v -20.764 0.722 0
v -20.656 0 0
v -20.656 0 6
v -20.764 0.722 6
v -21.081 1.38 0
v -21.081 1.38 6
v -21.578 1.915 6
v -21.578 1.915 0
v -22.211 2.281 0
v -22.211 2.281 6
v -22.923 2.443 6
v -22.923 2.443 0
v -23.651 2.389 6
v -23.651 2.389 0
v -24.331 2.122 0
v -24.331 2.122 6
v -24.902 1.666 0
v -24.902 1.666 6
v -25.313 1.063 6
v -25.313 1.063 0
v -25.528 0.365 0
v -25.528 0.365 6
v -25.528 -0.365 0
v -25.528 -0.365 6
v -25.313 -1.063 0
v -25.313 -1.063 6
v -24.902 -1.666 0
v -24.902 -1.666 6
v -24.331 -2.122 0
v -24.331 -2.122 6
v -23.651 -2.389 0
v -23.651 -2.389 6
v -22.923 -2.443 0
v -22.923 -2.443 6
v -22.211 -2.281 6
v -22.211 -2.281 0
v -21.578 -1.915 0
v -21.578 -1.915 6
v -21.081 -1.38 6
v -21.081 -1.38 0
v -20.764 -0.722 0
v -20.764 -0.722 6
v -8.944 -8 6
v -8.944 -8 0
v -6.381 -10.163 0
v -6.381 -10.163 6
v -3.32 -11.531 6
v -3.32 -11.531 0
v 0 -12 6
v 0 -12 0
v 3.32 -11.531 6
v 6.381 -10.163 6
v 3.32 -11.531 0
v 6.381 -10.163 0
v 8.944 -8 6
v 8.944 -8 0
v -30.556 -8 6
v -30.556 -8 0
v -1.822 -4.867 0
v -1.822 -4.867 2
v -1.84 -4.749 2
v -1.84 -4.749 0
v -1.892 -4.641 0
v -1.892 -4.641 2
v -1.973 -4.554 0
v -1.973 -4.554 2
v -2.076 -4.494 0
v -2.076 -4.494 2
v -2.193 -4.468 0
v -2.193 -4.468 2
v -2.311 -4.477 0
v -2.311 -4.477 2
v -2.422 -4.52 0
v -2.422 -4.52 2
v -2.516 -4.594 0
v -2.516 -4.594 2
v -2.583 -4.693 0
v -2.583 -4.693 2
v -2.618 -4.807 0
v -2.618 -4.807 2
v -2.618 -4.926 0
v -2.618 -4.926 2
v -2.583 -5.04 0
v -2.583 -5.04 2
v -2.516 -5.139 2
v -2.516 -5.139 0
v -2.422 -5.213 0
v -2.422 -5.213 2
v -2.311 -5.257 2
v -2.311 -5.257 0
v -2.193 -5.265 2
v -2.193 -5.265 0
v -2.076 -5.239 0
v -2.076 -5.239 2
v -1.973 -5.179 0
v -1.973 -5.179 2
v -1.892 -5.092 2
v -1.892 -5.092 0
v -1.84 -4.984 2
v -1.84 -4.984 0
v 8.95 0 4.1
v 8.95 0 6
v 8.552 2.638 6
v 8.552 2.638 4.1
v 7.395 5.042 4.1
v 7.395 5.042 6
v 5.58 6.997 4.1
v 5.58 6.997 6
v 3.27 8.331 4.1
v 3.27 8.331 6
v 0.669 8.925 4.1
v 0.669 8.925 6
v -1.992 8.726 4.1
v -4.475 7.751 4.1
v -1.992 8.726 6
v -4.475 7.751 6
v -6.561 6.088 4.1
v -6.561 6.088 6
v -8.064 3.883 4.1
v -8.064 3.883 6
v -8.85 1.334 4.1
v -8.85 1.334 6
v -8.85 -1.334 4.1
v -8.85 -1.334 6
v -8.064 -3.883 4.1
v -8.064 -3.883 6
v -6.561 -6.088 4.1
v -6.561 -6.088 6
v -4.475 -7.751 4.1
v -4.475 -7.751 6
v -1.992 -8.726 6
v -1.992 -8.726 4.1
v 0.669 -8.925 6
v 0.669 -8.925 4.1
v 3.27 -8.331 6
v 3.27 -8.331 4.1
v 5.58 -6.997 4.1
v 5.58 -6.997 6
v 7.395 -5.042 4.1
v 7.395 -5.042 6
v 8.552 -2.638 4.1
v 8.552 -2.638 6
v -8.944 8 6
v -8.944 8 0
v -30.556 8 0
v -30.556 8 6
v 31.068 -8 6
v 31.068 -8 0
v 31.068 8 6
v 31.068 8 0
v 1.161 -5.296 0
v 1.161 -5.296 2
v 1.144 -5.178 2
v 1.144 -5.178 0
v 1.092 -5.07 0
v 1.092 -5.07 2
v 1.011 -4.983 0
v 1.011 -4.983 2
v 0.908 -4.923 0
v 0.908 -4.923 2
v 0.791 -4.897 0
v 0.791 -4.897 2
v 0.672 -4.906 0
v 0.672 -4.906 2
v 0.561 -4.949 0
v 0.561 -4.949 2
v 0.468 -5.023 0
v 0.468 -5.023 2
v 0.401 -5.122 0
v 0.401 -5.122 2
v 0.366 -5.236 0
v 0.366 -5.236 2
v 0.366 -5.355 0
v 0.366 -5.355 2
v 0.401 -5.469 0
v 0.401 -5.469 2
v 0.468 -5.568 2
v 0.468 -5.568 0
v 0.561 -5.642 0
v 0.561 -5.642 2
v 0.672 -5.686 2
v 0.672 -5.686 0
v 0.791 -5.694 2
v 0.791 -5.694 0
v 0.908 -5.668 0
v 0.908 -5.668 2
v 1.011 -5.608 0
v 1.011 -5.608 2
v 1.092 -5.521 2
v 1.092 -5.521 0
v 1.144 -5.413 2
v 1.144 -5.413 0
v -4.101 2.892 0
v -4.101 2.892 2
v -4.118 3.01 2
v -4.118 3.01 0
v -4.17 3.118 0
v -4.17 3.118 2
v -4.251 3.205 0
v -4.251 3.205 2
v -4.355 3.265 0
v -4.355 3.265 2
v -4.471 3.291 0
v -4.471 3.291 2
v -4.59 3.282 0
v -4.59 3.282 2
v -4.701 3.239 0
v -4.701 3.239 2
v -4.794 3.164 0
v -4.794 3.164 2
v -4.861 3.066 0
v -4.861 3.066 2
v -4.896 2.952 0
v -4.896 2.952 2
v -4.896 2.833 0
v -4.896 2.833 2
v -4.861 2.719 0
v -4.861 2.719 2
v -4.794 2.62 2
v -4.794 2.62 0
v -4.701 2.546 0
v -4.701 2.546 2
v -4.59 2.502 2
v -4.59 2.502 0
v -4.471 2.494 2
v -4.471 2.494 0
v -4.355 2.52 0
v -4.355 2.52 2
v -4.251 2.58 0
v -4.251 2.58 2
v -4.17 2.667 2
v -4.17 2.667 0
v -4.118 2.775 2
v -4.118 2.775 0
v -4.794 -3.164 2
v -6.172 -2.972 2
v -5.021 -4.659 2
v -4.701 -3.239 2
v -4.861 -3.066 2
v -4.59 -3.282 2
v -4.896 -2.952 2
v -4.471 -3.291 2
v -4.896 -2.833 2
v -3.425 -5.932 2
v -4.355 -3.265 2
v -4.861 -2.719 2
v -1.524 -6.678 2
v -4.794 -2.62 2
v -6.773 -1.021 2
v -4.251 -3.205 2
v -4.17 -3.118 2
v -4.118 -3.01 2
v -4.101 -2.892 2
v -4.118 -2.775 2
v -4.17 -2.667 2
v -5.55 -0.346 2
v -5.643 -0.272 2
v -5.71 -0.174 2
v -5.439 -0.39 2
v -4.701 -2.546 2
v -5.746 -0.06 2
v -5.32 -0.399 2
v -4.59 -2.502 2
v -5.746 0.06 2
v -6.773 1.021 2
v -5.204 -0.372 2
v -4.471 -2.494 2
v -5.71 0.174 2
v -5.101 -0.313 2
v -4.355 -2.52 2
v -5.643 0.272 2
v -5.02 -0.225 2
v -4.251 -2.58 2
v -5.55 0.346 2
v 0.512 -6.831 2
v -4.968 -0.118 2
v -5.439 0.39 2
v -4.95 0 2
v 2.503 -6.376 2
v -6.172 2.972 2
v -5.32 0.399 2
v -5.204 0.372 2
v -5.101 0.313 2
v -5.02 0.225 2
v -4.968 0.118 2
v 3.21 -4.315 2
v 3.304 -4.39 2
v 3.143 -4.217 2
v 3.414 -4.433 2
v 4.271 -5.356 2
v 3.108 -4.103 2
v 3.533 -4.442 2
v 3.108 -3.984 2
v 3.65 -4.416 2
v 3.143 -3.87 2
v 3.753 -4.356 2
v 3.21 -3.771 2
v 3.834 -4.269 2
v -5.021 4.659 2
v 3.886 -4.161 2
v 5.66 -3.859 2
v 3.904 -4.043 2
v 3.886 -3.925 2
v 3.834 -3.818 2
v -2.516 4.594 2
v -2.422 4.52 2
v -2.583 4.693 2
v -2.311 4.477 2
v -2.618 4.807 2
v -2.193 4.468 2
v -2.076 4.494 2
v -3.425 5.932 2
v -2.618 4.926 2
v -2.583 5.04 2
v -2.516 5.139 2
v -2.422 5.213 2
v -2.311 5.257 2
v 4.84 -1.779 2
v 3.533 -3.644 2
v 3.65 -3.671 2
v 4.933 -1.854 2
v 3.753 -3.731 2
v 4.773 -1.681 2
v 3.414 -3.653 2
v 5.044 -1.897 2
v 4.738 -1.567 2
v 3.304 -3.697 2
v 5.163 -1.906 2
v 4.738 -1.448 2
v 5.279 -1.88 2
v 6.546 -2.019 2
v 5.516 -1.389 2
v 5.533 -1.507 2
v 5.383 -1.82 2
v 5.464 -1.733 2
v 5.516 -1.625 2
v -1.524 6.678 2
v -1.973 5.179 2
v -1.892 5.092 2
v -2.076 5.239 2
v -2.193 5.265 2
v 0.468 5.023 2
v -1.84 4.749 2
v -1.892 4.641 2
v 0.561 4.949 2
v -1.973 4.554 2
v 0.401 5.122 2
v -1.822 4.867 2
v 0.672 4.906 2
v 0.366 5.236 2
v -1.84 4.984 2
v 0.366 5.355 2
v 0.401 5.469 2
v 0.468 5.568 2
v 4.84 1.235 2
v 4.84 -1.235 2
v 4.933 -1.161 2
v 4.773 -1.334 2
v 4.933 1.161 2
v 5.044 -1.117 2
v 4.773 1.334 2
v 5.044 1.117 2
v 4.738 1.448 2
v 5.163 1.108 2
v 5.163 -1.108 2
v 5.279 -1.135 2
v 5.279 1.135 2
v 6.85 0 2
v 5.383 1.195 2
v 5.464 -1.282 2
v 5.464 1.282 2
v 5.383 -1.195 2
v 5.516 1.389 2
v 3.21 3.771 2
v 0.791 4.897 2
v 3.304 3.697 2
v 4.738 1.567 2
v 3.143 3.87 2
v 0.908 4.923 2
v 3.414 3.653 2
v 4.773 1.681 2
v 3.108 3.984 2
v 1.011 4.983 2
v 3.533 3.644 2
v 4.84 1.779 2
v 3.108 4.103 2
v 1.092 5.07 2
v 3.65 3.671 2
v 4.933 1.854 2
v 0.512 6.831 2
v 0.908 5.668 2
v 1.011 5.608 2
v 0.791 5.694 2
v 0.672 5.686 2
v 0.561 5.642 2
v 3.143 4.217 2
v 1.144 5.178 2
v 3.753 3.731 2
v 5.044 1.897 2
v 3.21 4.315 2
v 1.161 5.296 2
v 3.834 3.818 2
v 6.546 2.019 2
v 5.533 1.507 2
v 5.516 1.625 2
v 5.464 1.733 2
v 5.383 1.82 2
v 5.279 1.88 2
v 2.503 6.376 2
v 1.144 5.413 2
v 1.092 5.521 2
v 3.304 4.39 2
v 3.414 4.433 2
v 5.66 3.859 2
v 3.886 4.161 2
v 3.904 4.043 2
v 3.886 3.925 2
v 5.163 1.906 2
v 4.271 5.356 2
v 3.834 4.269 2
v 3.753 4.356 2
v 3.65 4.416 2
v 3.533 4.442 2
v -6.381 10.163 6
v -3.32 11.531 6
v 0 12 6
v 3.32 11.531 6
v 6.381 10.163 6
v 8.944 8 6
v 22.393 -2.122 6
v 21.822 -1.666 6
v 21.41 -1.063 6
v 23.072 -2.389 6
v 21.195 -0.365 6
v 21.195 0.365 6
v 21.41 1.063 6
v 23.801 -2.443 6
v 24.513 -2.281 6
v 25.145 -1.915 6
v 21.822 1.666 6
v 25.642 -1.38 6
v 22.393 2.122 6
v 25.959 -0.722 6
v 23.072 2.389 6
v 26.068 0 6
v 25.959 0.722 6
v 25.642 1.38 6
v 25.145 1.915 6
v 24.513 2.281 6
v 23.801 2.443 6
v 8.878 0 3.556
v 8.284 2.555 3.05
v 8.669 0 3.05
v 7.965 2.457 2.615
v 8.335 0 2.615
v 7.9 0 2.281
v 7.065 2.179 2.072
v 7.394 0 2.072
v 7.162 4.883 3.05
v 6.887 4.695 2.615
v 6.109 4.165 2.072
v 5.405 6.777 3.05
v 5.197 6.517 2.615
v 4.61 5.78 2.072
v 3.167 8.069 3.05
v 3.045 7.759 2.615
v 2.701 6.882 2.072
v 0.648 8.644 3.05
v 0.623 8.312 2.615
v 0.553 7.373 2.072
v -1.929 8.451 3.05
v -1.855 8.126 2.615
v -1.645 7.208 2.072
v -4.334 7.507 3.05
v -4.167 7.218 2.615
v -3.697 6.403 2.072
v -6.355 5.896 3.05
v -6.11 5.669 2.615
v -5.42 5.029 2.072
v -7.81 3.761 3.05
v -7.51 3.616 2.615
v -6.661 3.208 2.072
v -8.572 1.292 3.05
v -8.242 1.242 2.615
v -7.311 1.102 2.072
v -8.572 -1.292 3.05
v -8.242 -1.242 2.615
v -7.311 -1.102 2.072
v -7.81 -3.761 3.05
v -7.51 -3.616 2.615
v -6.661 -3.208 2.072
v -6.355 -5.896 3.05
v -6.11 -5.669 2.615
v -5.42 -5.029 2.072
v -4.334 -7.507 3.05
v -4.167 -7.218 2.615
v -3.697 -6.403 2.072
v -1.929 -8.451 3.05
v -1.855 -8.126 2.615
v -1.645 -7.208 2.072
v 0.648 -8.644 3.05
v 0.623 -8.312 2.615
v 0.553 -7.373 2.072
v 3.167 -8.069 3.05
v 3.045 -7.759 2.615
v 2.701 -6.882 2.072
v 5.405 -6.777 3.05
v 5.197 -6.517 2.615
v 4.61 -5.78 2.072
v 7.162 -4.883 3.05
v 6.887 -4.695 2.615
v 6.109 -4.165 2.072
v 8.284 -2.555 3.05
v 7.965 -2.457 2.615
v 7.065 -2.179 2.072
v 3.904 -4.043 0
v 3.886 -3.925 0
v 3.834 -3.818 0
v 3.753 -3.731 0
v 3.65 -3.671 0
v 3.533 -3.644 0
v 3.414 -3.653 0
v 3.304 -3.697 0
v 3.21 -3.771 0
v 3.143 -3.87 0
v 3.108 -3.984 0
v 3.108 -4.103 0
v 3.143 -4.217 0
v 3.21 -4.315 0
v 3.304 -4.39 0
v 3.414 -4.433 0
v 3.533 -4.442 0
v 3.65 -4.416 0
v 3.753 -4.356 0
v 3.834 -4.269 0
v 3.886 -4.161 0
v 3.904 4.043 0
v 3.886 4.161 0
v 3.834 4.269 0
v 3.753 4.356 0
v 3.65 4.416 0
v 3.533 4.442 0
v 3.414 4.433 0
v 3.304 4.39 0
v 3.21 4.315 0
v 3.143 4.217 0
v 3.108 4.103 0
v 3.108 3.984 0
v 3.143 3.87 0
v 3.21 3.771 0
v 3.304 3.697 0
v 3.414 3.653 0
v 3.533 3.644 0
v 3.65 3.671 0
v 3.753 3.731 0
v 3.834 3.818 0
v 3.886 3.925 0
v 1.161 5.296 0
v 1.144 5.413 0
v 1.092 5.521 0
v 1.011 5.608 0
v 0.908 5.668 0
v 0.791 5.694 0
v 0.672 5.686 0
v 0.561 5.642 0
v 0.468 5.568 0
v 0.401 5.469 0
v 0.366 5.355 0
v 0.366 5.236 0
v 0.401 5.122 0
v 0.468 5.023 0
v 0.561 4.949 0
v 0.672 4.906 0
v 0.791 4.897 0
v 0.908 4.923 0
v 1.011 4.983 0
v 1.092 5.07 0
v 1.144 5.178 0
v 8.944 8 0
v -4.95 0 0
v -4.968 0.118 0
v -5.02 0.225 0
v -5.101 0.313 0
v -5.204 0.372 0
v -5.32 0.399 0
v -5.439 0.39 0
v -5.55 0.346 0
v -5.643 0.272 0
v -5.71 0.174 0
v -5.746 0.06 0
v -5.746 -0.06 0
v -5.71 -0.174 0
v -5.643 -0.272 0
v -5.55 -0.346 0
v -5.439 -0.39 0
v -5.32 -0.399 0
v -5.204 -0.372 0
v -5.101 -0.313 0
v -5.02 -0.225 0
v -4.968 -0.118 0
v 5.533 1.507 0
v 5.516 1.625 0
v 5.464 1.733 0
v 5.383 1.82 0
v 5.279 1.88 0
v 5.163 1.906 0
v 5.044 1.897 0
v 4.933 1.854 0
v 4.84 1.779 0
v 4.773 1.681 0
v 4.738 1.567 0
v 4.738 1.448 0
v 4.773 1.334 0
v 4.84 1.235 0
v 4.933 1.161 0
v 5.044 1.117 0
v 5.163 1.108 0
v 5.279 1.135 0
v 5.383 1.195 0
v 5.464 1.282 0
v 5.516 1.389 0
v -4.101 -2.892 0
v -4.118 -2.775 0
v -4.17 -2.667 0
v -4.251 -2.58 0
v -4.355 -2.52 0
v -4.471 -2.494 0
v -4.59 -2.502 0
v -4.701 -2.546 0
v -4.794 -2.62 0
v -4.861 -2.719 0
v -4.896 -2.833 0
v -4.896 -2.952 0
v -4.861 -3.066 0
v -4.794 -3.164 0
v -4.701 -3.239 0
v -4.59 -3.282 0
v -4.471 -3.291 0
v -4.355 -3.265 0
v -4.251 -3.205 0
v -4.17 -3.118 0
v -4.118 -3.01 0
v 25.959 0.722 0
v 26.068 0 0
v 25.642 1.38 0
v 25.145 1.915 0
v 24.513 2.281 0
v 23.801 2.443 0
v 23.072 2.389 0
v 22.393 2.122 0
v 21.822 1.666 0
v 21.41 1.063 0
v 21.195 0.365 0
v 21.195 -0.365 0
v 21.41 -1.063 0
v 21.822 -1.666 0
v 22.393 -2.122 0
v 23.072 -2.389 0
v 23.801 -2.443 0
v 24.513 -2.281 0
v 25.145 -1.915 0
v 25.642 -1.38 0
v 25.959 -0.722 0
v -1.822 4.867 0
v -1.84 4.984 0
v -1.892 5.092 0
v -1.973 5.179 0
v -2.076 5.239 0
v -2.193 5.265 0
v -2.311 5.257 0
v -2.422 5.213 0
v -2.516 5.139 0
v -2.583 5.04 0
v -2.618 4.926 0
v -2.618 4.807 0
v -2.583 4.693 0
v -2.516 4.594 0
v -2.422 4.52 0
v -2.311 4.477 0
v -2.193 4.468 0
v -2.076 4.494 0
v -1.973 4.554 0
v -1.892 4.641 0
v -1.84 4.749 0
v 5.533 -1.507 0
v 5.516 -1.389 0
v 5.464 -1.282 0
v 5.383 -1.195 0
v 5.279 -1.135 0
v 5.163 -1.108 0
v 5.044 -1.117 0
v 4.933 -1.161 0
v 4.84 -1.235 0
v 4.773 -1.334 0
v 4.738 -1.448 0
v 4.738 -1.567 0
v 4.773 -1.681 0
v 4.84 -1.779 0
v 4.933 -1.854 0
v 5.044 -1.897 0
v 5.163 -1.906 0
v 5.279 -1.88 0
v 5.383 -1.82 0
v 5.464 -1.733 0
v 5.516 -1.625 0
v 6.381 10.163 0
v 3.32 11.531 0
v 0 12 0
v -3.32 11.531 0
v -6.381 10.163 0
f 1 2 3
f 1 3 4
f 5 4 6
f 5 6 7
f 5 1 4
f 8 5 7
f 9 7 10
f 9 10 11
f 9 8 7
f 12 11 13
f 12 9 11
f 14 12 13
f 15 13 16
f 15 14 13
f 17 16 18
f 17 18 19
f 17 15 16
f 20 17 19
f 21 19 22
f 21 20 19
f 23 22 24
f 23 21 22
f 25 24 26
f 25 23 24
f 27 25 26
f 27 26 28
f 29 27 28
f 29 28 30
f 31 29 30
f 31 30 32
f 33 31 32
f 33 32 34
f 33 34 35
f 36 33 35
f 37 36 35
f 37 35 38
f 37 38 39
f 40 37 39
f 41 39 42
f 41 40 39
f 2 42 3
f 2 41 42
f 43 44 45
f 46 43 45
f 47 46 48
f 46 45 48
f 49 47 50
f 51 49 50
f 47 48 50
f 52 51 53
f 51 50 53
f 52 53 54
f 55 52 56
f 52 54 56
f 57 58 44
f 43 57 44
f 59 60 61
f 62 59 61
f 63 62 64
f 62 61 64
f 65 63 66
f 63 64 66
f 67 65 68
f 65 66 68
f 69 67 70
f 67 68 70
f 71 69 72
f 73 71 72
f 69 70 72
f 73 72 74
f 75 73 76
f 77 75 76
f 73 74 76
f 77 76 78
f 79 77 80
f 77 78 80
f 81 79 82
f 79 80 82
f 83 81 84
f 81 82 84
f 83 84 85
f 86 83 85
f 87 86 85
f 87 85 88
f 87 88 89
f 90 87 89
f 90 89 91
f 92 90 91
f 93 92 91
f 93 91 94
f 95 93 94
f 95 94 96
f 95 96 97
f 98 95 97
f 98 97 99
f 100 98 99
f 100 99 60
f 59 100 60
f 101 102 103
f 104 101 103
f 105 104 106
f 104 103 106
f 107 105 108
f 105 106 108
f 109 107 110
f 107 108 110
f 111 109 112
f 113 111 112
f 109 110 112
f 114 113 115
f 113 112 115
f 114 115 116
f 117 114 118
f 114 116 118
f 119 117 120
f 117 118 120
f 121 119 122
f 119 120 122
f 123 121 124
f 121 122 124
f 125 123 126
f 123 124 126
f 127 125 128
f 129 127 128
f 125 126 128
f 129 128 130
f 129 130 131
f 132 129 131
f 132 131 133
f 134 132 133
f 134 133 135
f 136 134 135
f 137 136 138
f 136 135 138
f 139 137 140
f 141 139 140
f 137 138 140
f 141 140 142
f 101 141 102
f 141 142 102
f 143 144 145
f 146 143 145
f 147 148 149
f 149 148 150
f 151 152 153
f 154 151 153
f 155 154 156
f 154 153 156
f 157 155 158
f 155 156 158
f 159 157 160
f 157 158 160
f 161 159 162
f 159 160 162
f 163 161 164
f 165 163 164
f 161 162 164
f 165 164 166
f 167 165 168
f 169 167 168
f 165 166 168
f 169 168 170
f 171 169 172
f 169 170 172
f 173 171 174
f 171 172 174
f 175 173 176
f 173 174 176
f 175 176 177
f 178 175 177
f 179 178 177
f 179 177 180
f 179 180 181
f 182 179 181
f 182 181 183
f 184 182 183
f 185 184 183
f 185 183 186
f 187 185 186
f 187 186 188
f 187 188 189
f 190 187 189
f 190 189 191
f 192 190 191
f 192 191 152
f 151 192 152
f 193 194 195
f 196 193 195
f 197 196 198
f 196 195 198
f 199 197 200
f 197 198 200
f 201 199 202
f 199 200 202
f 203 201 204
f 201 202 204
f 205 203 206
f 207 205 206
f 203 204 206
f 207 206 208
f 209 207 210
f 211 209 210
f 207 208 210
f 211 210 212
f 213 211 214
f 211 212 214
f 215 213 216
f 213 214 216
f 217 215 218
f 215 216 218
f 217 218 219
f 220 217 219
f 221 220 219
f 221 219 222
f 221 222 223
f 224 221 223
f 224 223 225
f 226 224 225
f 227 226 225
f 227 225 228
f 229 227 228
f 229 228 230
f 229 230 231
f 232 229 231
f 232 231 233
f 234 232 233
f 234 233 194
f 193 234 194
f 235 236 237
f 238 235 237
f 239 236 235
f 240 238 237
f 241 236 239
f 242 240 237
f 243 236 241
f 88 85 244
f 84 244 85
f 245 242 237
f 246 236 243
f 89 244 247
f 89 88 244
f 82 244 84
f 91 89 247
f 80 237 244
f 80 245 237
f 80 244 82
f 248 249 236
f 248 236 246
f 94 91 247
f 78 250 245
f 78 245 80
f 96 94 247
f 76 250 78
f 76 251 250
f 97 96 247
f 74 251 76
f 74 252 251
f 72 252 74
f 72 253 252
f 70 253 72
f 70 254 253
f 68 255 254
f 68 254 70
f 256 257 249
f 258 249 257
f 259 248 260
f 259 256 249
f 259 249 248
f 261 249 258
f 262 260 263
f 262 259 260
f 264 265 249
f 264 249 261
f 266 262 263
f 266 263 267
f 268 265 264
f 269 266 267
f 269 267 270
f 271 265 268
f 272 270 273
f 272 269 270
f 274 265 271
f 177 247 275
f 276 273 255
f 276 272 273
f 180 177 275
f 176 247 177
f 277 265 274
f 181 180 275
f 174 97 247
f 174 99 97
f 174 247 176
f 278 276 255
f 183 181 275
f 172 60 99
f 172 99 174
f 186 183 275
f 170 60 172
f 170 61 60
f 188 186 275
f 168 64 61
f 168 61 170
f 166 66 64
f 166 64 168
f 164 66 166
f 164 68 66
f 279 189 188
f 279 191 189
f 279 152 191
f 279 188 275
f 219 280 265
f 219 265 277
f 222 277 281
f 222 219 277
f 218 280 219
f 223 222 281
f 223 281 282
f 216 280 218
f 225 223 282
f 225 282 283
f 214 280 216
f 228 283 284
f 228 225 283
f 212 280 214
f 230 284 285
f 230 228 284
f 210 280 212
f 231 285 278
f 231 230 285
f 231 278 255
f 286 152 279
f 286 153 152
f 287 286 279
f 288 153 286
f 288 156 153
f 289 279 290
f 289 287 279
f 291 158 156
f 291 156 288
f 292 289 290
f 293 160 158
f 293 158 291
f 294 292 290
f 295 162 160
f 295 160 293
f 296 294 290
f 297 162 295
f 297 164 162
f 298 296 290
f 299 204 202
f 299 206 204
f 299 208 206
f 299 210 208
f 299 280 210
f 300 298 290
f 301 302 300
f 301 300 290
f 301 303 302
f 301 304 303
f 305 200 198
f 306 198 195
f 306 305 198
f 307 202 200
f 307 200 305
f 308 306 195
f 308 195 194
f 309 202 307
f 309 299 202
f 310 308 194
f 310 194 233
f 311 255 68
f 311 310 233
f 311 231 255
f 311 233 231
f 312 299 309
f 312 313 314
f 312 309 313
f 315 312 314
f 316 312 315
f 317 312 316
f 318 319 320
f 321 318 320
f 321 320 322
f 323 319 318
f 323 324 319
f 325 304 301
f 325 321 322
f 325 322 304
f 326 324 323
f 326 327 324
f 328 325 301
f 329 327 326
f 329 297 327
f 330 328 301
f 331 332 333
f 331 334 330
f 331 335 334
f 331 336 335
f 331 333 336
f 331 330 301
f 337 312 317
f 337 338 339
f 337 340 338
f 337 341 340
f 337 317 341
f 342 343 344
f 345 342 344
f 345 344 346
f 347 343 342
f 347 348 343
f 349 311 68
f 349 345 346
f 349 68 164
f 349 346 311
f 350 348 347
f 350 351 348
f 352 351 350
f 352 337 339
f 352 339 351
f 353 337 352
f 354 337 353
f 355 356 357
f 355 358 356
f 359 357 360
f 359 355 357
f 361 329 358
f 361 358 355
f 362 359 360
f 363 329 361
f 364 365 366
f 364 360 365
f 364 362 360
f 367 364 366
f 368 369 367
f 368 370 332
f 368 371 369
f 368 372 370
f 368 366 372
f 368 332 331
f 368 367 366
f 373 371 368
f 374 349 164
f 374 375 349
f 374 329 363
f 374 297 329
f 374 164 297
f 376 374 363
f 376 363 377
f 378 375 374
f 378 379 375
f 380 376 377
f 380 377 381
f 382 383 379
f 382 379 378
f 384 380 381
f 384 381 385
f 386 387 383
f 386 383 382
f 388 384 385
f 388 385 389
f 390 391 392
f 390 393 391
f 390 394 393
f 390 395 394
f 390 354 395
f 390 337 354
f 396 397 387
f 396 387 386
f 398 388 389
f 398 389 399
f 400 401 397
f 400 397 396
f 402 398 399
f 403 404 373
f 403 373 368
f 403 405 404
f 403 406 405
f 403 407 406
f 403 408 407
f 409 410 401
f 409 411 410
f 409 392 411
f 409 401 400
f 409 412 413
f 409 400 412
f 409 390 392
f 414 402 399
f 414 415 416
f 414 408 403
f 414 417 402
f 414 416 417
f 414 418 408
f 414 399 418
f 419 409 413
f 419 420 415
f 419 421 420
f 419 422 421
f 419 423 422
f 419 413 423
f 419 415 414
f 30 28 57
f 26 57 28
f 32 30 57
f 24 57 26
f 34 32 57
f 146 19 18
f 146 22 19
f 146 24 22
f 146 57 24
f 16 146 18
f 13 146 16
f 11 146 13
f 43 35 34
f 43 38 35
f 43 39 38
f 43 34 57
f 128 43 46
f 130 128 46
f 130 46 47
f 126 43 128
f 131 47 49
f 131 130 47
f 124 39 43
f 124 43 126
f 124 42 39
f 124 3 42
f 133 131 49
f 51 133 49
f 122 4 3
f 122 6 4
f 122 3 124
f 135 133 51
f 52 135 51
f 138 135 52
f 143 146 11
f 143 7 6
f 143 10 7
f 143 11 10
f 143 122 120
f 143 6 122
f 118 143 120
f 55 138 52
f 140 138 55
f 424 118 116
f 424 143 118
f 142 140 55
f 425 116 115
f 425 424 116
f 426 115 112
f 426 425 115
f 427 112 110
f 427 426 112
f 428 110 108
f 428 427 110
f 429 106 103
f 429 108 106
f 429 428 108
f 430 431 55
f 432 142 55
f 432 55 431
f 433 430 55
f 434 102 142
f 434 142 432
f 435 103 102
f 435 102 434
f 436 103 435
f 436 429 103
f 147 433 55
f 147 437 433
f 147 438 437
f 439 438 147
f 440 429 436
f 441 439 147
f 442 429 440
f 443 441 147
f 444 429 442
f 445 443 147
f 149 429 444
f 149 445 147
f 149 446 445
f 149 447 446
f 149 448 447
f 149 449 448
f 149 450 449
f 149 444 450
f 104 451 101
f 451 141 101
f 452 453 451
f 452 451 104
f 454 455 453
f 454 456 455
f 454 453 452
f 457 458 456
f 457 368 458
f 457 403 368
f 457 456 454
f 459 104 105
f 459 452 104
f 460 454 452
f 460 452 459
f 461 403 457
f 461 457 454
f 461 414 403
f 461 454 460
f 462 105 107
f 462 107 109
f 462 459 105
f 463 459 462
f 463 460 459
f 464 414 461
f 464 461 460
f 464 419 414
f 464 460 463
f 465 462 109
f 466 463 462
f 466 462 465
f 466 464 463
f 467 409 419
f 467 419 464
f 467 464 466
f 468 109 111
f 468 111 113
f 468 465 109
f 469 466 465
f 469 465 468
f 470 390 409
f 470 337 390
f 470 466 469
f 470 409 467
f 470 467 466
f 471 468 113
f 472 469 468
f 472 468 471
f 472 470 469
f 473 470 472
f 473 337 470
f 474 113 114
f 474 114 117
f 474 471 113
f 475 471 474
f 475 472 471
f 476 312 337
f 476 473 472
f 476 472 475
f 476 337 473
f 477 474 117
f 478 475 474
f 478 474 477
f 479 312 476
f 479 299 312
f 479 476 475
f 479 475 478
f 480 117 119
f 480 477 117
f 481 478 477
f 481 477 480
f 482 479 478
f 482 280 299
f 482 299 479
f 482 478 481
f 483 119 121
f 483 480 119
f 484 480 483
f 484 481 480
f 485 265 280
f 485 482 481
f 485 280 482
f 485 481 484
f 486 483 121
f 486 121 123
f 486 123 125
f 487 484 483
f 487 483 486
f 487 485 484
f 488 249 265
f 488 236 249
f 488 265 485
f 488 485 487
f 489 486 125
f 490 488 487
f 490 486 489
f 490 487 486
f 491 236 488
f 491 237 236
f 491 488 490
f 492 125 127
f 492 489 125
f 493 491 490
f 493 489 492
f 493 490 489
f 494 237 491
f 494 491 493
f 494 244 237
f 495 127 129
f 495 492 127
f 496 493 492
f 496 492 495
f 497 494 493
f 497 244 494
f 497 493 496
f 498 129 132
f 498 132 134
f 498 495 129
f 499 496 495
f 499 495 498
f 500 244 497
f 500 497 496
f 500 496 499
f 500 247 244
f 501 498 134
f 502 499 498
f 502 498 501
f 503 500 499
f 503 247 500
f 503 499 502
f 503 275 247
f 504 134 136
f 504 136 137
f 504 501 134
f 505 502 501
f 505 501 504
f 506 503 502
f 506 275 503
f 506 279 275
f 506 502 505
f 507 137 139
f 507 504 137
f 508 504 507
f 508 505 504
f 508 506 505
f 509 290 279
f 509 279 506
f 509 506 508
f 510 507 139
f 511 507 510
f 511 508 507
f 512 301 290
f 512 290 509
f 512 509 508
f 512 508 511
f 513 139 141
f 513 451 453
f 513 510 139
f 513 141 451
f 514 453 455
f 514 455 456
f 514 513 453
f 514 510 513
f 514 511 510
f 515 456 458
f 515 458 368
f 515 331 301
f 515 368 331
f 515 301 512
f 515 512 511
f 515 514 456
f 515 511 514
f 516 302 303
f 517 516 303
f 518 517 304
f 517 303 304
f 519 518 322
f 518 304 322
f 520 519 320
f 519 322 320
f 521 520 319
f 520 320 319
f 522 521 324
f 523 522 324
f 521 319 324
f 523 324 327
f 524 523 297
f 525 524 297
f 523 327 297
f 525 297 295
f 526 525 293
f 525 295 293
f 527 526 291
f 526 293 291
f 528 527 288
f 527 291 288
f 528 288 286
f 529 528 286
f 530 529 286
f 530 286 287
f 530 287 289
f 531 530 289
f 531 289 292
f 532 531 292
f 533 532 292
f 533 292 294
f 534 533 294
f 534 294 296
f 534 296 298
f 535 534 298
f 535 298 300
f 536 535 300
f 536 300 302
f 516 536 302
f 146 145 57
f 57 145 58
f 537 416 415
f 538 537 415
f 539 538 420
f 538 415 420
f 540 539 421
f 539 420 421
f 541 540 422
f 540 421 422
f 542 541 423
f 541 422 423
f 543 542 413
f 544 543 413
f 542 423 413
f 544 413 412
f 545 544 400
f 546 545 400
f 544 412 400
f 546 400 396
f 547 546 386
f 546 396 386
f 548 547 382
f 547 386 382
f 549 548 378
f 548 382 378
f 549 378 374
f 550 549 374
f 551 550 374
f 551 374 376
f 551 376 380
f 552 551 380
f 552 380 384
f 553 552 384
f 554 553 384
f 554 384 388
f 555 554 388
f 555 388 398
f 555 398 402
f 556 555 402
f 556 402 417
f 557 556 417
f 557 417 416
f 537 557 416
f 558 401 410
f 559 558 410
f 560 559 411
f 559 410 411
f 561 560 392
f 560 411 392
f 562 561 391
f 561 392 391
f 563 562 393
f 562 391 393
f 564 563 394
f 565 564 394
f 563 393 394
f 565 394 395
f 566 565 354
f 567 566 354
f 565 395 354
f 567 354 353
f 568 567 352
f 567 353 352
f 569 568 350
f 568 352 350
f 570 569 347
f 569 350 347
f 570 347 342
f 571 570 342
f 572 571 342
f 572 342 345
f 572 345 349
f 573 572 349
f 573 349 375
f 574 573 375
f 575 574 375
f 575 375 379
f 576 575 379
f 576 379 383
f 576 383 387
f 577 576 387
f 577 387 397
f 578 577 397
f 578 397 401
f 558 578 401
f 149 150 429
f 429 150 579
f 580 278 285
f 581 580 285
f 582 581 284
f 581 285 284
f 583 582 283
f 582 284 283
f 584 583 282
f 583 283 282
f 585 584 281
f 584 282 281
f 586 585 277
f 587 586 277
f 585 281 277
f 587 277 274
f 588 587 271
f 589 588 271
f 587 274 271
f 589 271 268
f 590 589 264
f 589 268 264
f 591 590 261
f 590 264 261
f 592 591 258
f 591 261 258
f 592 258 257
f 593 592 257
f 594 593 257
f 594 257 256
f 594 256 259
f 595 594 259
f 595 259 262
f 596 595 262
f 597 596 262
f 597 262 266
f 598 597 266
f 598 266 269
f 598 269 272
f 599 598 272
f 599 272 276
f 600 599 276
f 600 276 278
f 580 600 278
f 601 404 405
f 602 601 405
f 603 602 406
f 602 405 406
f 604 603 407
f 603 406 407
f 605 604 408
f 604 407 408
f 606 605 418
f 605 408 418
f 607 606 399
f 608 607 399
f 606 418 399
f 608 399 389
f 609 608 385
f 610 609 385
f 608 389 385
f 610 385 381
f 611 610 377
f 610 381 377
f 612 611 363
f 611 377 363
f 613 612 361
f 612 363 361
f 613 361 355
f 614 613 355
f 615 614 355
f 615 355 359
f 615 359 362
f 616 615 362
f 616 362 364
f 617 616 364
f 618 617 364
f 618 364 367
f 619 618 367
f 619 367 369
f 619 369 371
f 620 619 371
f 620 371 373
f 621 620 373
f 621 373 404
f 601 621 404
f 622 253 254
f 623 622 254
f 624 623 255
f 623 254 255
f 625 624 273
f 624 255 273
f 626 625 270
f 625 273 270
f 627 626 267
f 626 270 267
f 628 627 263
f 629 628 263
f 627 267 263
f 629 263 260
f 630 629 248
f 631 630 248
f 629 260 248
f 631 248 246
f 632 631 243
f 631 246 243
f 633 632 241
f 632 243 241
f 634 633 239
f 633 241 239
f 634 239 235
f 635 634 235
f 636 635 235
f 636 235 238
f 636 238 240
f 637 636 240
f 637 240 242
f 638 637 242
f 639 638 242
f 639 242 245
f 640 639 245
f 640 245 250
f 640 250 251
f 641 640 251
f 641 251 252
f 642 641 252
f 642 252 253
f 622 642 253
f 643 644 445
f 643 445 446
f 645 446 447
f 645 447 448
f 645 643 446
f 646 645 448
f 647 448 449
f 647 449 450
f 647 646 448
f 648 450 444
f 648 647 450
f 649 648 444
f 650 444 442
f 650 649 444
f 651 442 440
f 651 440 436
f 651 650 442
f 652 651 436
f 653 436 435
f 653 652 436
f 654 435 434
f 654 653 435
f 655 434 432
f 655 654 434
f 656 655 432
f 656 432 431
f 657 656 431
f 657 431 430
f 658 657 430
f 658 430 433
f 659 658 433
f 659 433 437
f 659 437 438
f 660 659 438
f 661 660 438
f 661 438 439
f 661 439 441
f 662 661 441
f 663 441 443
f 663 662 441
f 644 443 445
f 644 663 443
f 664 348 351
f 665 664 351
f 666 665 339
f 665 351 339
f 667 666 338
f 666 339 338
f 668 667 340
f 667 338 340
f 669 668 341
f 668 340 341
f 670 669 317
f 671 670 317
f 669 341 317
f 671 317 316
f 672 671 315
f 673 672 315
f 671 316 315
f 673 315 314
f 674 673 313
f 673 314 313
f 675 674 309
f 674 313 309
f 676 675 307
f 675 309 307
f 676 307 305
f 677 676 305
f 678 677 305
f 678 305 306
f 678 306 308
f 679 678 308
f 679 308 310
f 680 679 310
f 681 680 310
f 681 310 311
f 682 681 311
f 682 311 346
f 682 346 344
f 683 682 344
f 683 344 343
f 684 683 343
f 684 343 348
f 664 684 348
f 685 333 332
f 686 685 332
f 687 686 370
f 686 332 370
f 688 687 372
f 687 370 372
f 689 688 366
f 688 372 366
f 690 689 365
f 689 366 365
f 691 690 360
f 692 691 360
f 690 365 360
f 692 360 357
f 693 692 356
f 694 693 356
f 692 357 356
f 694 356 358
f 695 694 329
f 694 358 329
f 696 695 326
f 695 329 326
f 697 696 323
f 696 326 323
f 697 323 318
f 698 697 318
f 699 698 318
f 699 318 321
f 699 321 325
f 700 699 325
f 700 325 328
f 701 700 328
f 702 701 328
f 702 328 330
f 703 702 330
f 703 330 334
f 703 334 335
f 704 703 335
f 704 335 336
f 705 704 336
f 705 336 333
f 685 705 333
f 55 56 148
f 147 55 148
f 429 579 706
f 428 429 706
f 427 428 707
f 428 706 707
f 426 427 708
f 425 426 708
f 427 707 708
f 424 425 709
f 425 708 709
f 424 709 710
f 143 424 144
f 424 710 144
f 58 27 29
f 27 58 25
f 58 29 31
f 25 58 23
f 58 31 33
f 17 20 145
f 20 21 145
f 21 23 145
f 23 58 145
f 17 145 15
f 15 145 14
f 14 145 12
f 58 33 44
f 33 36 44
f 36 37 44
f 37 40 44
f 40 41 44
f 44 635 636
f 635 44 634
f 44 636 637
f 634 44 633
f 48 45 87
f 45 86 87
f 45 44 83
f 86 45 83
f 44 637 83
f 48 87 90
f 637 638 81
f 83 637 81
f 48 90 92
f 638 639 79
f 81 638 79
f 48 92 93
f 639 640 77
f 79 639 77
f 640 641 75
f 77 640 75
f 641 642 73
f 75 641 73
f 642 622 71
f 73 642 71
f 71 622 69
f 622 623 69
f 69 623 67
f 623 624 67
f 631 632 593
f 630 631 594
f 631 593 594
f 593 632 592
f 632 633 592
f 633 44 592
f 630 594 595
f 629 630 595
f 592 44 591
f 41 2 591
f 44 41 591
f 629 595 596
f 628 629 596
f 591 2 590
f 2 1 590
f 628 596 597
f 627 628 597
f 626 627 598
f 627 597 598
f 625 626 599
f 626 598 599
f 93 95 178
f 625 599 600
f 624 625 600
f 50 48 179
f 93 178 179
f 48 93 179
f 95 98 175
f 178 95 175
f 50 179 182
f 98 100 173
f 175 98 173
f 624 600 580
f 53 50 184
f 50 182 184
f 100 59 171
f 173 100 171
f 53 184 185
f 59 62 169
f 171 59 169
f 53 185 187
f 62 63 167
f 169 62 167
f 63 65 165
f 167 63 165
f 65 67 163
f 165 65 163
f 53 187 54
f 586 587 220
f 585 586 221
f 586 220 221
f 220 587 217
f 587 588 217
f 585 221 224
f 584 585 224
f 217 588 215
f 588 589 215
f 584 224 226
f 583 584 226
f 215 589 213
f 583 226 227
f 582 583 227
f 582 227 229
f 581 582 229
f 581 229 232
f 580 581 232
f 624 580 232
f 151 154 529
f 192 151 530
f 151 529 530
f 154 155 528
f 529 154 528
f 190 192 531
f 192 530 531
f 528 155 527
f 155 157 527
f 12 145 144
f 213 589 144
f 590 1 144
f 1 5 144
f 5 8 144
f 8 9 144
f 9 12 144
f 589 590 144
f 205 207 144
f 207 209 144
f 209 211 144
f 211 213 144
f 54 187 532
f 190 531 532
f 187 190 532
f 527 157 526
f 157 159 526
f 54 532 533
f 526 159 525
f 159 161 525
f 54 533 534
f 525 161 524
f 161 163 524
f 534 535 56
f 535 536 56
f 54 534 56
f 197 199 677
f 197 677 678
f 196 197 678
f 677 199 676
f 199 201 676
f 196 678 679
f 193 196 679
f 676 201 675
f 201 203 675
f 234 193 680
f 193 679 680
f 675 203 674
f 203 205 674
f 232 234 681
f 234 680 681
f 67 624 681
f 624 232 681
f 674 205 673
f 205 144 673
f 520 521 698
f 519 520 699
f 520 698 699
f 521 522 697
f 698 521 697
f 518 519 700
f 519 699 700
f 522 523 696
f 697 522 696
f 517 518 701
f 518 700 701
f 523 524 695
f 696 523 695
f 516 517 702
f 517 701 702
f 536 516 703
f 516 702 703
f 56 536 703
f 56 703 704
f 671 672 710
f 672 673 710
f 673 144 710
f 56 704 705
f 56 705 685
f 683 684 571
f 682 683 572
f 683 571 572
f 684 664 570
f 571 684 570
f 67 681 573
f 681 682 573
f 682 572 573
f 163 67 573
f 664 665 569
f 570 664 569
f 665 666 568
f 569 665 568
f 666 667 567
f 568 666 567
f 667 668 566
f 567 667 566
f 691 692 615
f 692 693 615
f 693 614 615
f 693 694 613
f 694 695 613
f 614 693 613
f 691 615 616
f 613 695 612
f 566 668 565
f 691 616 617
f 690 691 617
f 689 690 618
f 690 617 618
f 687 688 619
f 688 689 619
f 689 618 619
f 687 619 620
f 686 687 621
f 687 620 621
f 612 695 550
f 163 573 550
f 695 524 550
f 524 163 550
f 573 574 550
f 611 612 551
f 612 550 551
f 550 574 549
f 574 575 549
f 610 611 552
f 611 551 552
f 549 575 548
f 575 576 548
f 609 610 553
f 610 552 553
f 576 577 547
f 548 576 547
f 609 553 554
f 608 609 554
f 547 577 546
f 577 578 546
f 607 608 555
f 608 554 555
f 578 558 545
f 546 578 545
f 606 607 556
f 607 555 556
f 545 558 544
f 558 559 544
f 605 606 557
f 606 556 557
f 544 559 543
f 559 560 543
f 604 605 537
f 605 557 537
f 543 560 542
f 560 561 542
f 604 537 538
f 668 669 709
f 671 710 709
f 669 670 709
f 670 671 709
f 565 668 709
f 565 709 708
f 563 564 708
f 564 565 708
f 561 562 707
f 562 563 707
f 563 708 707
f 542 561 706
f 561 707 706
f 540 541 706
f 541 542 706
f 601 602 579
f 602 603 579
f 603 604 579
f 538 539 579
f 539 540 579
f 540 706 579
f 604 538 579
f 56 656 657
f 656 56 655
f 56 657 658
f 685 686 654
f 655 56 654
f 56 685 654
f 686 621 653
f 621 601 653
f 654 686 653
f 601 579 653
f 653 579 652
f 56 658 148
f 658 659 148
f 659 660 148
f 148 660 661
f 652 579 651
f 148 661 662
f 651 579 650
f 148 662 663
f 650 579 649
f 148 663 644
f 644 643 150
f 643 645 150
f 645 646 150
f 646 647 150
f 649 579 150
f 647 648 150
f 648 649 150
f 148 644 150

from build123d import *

# Parameters (mm, degrees)
F0_R     = 2.45
F1_DEPTH = 6
F2_R     = 8.95
F3_DEPTH = 4
F4_R     = 2.1
F5_R     = 0.4
F6_DEPTH = 2.001


with BuildPart() as f1:
    # F0 (on Top) → F1 (new body)
    with BuildSketch(Plane.XY):
        with BuildLine():
            ThreePointArc((8.944272, -8), (11.210068, -4.281865), (12, 0))
            ThreePointArc((12, 0), (11.210068, 4.281865), (8.944272, 8))
            ThreePointArc((8.944272, 8), (0, 12), (-8.944272, 8))
            ThreePointArc((-8.944272, 8), (-12, 0), (-8.944272, -8))
            ThreePointArc((-8.944272, -8), (0, -12), (8.944272, -8))
        make_face()
        with BuildLine():
            ThreePointArc((8.944272, 8), (11.210068, 4.281865), (12, 0))
            ThreePointArc((12, 0), (11.210068, -4.281865), (8.944272, -8))
            Line((8.944272, -8), (31.067557, -8))
            Line((31.067557, -8), (31.067557, 8))
            Line((31.067557, 8), (8.944272, 8))
        make_face()
        with Locations((23.617557, 0)):
            Circle(F0_R, mode=Mode.SUBTRACT)
        with BuildLine():
            ThreePointArc((-8.944272, -8), (-12, 0), (-8.944272, 8))
            Line((-8.944272, 8), (-30.555639, 8))
            Line((-30.555639, 8), (-30.555639, -8))
            Line((-30.555639, -8), (-8.944272, -8))
        make_face()
        with Locations((-23.105639, 0)):
            Circle(F0_R, mode=Mode.SUBTRACT)
    extrude(amount=F1_DEPTH)

    # F2 (on face) → F3 (cut)
    with BuildSketch(Plane.XY.offset(6)):
        Circle(F2_R)
    extrude(amount=-F3_DEPTH, mode=Mode.SUBTRACT)

    # F4
    f4_edges = [f1.edges().sort_by_distance(p)[0] for p in [
        (-8.95, 0, 2),
    ]]
    fillet(f4_edges, radius=F4_R)

    # F5 (on face) → F6 (cut, through all)
    with BuildSketch(Plane.XY.offset(2)):
        with Locations((-5.35, 0)):
            Circle(F5_R)
        with Locations((-4.500706, -2.892428)):
            Circle(F5_R)
        with Locations((-2.22247, -4.866531)):
            Circle(F5_R)
        with Locations((0.761384, -5.295545)):
            Circle(F5_R)
        with Locations((3.503505, -4.04326)):
            Circle(F5_R)
        with Locations((5.133287, -1.507269)):
            Circle(F5_R)
        with Locations((5.133287, 1.507269)):
            Circle(F5_R)
        with Locations((3.503505, 4.04326)):
            Circle(F5_R)
        with Locations((0.761384, 5.295545)):
            Circle(F5_R)
        with Locations((-2.22247, 4.866531)):
            Circle(F5_R)
        with Locations((-4.500706, 2.892428)):
            Circle(F5_R)
    extrude(amount=-F6_DEPTH, mode=Mode.SUBTRACT)


solid = f1.part
